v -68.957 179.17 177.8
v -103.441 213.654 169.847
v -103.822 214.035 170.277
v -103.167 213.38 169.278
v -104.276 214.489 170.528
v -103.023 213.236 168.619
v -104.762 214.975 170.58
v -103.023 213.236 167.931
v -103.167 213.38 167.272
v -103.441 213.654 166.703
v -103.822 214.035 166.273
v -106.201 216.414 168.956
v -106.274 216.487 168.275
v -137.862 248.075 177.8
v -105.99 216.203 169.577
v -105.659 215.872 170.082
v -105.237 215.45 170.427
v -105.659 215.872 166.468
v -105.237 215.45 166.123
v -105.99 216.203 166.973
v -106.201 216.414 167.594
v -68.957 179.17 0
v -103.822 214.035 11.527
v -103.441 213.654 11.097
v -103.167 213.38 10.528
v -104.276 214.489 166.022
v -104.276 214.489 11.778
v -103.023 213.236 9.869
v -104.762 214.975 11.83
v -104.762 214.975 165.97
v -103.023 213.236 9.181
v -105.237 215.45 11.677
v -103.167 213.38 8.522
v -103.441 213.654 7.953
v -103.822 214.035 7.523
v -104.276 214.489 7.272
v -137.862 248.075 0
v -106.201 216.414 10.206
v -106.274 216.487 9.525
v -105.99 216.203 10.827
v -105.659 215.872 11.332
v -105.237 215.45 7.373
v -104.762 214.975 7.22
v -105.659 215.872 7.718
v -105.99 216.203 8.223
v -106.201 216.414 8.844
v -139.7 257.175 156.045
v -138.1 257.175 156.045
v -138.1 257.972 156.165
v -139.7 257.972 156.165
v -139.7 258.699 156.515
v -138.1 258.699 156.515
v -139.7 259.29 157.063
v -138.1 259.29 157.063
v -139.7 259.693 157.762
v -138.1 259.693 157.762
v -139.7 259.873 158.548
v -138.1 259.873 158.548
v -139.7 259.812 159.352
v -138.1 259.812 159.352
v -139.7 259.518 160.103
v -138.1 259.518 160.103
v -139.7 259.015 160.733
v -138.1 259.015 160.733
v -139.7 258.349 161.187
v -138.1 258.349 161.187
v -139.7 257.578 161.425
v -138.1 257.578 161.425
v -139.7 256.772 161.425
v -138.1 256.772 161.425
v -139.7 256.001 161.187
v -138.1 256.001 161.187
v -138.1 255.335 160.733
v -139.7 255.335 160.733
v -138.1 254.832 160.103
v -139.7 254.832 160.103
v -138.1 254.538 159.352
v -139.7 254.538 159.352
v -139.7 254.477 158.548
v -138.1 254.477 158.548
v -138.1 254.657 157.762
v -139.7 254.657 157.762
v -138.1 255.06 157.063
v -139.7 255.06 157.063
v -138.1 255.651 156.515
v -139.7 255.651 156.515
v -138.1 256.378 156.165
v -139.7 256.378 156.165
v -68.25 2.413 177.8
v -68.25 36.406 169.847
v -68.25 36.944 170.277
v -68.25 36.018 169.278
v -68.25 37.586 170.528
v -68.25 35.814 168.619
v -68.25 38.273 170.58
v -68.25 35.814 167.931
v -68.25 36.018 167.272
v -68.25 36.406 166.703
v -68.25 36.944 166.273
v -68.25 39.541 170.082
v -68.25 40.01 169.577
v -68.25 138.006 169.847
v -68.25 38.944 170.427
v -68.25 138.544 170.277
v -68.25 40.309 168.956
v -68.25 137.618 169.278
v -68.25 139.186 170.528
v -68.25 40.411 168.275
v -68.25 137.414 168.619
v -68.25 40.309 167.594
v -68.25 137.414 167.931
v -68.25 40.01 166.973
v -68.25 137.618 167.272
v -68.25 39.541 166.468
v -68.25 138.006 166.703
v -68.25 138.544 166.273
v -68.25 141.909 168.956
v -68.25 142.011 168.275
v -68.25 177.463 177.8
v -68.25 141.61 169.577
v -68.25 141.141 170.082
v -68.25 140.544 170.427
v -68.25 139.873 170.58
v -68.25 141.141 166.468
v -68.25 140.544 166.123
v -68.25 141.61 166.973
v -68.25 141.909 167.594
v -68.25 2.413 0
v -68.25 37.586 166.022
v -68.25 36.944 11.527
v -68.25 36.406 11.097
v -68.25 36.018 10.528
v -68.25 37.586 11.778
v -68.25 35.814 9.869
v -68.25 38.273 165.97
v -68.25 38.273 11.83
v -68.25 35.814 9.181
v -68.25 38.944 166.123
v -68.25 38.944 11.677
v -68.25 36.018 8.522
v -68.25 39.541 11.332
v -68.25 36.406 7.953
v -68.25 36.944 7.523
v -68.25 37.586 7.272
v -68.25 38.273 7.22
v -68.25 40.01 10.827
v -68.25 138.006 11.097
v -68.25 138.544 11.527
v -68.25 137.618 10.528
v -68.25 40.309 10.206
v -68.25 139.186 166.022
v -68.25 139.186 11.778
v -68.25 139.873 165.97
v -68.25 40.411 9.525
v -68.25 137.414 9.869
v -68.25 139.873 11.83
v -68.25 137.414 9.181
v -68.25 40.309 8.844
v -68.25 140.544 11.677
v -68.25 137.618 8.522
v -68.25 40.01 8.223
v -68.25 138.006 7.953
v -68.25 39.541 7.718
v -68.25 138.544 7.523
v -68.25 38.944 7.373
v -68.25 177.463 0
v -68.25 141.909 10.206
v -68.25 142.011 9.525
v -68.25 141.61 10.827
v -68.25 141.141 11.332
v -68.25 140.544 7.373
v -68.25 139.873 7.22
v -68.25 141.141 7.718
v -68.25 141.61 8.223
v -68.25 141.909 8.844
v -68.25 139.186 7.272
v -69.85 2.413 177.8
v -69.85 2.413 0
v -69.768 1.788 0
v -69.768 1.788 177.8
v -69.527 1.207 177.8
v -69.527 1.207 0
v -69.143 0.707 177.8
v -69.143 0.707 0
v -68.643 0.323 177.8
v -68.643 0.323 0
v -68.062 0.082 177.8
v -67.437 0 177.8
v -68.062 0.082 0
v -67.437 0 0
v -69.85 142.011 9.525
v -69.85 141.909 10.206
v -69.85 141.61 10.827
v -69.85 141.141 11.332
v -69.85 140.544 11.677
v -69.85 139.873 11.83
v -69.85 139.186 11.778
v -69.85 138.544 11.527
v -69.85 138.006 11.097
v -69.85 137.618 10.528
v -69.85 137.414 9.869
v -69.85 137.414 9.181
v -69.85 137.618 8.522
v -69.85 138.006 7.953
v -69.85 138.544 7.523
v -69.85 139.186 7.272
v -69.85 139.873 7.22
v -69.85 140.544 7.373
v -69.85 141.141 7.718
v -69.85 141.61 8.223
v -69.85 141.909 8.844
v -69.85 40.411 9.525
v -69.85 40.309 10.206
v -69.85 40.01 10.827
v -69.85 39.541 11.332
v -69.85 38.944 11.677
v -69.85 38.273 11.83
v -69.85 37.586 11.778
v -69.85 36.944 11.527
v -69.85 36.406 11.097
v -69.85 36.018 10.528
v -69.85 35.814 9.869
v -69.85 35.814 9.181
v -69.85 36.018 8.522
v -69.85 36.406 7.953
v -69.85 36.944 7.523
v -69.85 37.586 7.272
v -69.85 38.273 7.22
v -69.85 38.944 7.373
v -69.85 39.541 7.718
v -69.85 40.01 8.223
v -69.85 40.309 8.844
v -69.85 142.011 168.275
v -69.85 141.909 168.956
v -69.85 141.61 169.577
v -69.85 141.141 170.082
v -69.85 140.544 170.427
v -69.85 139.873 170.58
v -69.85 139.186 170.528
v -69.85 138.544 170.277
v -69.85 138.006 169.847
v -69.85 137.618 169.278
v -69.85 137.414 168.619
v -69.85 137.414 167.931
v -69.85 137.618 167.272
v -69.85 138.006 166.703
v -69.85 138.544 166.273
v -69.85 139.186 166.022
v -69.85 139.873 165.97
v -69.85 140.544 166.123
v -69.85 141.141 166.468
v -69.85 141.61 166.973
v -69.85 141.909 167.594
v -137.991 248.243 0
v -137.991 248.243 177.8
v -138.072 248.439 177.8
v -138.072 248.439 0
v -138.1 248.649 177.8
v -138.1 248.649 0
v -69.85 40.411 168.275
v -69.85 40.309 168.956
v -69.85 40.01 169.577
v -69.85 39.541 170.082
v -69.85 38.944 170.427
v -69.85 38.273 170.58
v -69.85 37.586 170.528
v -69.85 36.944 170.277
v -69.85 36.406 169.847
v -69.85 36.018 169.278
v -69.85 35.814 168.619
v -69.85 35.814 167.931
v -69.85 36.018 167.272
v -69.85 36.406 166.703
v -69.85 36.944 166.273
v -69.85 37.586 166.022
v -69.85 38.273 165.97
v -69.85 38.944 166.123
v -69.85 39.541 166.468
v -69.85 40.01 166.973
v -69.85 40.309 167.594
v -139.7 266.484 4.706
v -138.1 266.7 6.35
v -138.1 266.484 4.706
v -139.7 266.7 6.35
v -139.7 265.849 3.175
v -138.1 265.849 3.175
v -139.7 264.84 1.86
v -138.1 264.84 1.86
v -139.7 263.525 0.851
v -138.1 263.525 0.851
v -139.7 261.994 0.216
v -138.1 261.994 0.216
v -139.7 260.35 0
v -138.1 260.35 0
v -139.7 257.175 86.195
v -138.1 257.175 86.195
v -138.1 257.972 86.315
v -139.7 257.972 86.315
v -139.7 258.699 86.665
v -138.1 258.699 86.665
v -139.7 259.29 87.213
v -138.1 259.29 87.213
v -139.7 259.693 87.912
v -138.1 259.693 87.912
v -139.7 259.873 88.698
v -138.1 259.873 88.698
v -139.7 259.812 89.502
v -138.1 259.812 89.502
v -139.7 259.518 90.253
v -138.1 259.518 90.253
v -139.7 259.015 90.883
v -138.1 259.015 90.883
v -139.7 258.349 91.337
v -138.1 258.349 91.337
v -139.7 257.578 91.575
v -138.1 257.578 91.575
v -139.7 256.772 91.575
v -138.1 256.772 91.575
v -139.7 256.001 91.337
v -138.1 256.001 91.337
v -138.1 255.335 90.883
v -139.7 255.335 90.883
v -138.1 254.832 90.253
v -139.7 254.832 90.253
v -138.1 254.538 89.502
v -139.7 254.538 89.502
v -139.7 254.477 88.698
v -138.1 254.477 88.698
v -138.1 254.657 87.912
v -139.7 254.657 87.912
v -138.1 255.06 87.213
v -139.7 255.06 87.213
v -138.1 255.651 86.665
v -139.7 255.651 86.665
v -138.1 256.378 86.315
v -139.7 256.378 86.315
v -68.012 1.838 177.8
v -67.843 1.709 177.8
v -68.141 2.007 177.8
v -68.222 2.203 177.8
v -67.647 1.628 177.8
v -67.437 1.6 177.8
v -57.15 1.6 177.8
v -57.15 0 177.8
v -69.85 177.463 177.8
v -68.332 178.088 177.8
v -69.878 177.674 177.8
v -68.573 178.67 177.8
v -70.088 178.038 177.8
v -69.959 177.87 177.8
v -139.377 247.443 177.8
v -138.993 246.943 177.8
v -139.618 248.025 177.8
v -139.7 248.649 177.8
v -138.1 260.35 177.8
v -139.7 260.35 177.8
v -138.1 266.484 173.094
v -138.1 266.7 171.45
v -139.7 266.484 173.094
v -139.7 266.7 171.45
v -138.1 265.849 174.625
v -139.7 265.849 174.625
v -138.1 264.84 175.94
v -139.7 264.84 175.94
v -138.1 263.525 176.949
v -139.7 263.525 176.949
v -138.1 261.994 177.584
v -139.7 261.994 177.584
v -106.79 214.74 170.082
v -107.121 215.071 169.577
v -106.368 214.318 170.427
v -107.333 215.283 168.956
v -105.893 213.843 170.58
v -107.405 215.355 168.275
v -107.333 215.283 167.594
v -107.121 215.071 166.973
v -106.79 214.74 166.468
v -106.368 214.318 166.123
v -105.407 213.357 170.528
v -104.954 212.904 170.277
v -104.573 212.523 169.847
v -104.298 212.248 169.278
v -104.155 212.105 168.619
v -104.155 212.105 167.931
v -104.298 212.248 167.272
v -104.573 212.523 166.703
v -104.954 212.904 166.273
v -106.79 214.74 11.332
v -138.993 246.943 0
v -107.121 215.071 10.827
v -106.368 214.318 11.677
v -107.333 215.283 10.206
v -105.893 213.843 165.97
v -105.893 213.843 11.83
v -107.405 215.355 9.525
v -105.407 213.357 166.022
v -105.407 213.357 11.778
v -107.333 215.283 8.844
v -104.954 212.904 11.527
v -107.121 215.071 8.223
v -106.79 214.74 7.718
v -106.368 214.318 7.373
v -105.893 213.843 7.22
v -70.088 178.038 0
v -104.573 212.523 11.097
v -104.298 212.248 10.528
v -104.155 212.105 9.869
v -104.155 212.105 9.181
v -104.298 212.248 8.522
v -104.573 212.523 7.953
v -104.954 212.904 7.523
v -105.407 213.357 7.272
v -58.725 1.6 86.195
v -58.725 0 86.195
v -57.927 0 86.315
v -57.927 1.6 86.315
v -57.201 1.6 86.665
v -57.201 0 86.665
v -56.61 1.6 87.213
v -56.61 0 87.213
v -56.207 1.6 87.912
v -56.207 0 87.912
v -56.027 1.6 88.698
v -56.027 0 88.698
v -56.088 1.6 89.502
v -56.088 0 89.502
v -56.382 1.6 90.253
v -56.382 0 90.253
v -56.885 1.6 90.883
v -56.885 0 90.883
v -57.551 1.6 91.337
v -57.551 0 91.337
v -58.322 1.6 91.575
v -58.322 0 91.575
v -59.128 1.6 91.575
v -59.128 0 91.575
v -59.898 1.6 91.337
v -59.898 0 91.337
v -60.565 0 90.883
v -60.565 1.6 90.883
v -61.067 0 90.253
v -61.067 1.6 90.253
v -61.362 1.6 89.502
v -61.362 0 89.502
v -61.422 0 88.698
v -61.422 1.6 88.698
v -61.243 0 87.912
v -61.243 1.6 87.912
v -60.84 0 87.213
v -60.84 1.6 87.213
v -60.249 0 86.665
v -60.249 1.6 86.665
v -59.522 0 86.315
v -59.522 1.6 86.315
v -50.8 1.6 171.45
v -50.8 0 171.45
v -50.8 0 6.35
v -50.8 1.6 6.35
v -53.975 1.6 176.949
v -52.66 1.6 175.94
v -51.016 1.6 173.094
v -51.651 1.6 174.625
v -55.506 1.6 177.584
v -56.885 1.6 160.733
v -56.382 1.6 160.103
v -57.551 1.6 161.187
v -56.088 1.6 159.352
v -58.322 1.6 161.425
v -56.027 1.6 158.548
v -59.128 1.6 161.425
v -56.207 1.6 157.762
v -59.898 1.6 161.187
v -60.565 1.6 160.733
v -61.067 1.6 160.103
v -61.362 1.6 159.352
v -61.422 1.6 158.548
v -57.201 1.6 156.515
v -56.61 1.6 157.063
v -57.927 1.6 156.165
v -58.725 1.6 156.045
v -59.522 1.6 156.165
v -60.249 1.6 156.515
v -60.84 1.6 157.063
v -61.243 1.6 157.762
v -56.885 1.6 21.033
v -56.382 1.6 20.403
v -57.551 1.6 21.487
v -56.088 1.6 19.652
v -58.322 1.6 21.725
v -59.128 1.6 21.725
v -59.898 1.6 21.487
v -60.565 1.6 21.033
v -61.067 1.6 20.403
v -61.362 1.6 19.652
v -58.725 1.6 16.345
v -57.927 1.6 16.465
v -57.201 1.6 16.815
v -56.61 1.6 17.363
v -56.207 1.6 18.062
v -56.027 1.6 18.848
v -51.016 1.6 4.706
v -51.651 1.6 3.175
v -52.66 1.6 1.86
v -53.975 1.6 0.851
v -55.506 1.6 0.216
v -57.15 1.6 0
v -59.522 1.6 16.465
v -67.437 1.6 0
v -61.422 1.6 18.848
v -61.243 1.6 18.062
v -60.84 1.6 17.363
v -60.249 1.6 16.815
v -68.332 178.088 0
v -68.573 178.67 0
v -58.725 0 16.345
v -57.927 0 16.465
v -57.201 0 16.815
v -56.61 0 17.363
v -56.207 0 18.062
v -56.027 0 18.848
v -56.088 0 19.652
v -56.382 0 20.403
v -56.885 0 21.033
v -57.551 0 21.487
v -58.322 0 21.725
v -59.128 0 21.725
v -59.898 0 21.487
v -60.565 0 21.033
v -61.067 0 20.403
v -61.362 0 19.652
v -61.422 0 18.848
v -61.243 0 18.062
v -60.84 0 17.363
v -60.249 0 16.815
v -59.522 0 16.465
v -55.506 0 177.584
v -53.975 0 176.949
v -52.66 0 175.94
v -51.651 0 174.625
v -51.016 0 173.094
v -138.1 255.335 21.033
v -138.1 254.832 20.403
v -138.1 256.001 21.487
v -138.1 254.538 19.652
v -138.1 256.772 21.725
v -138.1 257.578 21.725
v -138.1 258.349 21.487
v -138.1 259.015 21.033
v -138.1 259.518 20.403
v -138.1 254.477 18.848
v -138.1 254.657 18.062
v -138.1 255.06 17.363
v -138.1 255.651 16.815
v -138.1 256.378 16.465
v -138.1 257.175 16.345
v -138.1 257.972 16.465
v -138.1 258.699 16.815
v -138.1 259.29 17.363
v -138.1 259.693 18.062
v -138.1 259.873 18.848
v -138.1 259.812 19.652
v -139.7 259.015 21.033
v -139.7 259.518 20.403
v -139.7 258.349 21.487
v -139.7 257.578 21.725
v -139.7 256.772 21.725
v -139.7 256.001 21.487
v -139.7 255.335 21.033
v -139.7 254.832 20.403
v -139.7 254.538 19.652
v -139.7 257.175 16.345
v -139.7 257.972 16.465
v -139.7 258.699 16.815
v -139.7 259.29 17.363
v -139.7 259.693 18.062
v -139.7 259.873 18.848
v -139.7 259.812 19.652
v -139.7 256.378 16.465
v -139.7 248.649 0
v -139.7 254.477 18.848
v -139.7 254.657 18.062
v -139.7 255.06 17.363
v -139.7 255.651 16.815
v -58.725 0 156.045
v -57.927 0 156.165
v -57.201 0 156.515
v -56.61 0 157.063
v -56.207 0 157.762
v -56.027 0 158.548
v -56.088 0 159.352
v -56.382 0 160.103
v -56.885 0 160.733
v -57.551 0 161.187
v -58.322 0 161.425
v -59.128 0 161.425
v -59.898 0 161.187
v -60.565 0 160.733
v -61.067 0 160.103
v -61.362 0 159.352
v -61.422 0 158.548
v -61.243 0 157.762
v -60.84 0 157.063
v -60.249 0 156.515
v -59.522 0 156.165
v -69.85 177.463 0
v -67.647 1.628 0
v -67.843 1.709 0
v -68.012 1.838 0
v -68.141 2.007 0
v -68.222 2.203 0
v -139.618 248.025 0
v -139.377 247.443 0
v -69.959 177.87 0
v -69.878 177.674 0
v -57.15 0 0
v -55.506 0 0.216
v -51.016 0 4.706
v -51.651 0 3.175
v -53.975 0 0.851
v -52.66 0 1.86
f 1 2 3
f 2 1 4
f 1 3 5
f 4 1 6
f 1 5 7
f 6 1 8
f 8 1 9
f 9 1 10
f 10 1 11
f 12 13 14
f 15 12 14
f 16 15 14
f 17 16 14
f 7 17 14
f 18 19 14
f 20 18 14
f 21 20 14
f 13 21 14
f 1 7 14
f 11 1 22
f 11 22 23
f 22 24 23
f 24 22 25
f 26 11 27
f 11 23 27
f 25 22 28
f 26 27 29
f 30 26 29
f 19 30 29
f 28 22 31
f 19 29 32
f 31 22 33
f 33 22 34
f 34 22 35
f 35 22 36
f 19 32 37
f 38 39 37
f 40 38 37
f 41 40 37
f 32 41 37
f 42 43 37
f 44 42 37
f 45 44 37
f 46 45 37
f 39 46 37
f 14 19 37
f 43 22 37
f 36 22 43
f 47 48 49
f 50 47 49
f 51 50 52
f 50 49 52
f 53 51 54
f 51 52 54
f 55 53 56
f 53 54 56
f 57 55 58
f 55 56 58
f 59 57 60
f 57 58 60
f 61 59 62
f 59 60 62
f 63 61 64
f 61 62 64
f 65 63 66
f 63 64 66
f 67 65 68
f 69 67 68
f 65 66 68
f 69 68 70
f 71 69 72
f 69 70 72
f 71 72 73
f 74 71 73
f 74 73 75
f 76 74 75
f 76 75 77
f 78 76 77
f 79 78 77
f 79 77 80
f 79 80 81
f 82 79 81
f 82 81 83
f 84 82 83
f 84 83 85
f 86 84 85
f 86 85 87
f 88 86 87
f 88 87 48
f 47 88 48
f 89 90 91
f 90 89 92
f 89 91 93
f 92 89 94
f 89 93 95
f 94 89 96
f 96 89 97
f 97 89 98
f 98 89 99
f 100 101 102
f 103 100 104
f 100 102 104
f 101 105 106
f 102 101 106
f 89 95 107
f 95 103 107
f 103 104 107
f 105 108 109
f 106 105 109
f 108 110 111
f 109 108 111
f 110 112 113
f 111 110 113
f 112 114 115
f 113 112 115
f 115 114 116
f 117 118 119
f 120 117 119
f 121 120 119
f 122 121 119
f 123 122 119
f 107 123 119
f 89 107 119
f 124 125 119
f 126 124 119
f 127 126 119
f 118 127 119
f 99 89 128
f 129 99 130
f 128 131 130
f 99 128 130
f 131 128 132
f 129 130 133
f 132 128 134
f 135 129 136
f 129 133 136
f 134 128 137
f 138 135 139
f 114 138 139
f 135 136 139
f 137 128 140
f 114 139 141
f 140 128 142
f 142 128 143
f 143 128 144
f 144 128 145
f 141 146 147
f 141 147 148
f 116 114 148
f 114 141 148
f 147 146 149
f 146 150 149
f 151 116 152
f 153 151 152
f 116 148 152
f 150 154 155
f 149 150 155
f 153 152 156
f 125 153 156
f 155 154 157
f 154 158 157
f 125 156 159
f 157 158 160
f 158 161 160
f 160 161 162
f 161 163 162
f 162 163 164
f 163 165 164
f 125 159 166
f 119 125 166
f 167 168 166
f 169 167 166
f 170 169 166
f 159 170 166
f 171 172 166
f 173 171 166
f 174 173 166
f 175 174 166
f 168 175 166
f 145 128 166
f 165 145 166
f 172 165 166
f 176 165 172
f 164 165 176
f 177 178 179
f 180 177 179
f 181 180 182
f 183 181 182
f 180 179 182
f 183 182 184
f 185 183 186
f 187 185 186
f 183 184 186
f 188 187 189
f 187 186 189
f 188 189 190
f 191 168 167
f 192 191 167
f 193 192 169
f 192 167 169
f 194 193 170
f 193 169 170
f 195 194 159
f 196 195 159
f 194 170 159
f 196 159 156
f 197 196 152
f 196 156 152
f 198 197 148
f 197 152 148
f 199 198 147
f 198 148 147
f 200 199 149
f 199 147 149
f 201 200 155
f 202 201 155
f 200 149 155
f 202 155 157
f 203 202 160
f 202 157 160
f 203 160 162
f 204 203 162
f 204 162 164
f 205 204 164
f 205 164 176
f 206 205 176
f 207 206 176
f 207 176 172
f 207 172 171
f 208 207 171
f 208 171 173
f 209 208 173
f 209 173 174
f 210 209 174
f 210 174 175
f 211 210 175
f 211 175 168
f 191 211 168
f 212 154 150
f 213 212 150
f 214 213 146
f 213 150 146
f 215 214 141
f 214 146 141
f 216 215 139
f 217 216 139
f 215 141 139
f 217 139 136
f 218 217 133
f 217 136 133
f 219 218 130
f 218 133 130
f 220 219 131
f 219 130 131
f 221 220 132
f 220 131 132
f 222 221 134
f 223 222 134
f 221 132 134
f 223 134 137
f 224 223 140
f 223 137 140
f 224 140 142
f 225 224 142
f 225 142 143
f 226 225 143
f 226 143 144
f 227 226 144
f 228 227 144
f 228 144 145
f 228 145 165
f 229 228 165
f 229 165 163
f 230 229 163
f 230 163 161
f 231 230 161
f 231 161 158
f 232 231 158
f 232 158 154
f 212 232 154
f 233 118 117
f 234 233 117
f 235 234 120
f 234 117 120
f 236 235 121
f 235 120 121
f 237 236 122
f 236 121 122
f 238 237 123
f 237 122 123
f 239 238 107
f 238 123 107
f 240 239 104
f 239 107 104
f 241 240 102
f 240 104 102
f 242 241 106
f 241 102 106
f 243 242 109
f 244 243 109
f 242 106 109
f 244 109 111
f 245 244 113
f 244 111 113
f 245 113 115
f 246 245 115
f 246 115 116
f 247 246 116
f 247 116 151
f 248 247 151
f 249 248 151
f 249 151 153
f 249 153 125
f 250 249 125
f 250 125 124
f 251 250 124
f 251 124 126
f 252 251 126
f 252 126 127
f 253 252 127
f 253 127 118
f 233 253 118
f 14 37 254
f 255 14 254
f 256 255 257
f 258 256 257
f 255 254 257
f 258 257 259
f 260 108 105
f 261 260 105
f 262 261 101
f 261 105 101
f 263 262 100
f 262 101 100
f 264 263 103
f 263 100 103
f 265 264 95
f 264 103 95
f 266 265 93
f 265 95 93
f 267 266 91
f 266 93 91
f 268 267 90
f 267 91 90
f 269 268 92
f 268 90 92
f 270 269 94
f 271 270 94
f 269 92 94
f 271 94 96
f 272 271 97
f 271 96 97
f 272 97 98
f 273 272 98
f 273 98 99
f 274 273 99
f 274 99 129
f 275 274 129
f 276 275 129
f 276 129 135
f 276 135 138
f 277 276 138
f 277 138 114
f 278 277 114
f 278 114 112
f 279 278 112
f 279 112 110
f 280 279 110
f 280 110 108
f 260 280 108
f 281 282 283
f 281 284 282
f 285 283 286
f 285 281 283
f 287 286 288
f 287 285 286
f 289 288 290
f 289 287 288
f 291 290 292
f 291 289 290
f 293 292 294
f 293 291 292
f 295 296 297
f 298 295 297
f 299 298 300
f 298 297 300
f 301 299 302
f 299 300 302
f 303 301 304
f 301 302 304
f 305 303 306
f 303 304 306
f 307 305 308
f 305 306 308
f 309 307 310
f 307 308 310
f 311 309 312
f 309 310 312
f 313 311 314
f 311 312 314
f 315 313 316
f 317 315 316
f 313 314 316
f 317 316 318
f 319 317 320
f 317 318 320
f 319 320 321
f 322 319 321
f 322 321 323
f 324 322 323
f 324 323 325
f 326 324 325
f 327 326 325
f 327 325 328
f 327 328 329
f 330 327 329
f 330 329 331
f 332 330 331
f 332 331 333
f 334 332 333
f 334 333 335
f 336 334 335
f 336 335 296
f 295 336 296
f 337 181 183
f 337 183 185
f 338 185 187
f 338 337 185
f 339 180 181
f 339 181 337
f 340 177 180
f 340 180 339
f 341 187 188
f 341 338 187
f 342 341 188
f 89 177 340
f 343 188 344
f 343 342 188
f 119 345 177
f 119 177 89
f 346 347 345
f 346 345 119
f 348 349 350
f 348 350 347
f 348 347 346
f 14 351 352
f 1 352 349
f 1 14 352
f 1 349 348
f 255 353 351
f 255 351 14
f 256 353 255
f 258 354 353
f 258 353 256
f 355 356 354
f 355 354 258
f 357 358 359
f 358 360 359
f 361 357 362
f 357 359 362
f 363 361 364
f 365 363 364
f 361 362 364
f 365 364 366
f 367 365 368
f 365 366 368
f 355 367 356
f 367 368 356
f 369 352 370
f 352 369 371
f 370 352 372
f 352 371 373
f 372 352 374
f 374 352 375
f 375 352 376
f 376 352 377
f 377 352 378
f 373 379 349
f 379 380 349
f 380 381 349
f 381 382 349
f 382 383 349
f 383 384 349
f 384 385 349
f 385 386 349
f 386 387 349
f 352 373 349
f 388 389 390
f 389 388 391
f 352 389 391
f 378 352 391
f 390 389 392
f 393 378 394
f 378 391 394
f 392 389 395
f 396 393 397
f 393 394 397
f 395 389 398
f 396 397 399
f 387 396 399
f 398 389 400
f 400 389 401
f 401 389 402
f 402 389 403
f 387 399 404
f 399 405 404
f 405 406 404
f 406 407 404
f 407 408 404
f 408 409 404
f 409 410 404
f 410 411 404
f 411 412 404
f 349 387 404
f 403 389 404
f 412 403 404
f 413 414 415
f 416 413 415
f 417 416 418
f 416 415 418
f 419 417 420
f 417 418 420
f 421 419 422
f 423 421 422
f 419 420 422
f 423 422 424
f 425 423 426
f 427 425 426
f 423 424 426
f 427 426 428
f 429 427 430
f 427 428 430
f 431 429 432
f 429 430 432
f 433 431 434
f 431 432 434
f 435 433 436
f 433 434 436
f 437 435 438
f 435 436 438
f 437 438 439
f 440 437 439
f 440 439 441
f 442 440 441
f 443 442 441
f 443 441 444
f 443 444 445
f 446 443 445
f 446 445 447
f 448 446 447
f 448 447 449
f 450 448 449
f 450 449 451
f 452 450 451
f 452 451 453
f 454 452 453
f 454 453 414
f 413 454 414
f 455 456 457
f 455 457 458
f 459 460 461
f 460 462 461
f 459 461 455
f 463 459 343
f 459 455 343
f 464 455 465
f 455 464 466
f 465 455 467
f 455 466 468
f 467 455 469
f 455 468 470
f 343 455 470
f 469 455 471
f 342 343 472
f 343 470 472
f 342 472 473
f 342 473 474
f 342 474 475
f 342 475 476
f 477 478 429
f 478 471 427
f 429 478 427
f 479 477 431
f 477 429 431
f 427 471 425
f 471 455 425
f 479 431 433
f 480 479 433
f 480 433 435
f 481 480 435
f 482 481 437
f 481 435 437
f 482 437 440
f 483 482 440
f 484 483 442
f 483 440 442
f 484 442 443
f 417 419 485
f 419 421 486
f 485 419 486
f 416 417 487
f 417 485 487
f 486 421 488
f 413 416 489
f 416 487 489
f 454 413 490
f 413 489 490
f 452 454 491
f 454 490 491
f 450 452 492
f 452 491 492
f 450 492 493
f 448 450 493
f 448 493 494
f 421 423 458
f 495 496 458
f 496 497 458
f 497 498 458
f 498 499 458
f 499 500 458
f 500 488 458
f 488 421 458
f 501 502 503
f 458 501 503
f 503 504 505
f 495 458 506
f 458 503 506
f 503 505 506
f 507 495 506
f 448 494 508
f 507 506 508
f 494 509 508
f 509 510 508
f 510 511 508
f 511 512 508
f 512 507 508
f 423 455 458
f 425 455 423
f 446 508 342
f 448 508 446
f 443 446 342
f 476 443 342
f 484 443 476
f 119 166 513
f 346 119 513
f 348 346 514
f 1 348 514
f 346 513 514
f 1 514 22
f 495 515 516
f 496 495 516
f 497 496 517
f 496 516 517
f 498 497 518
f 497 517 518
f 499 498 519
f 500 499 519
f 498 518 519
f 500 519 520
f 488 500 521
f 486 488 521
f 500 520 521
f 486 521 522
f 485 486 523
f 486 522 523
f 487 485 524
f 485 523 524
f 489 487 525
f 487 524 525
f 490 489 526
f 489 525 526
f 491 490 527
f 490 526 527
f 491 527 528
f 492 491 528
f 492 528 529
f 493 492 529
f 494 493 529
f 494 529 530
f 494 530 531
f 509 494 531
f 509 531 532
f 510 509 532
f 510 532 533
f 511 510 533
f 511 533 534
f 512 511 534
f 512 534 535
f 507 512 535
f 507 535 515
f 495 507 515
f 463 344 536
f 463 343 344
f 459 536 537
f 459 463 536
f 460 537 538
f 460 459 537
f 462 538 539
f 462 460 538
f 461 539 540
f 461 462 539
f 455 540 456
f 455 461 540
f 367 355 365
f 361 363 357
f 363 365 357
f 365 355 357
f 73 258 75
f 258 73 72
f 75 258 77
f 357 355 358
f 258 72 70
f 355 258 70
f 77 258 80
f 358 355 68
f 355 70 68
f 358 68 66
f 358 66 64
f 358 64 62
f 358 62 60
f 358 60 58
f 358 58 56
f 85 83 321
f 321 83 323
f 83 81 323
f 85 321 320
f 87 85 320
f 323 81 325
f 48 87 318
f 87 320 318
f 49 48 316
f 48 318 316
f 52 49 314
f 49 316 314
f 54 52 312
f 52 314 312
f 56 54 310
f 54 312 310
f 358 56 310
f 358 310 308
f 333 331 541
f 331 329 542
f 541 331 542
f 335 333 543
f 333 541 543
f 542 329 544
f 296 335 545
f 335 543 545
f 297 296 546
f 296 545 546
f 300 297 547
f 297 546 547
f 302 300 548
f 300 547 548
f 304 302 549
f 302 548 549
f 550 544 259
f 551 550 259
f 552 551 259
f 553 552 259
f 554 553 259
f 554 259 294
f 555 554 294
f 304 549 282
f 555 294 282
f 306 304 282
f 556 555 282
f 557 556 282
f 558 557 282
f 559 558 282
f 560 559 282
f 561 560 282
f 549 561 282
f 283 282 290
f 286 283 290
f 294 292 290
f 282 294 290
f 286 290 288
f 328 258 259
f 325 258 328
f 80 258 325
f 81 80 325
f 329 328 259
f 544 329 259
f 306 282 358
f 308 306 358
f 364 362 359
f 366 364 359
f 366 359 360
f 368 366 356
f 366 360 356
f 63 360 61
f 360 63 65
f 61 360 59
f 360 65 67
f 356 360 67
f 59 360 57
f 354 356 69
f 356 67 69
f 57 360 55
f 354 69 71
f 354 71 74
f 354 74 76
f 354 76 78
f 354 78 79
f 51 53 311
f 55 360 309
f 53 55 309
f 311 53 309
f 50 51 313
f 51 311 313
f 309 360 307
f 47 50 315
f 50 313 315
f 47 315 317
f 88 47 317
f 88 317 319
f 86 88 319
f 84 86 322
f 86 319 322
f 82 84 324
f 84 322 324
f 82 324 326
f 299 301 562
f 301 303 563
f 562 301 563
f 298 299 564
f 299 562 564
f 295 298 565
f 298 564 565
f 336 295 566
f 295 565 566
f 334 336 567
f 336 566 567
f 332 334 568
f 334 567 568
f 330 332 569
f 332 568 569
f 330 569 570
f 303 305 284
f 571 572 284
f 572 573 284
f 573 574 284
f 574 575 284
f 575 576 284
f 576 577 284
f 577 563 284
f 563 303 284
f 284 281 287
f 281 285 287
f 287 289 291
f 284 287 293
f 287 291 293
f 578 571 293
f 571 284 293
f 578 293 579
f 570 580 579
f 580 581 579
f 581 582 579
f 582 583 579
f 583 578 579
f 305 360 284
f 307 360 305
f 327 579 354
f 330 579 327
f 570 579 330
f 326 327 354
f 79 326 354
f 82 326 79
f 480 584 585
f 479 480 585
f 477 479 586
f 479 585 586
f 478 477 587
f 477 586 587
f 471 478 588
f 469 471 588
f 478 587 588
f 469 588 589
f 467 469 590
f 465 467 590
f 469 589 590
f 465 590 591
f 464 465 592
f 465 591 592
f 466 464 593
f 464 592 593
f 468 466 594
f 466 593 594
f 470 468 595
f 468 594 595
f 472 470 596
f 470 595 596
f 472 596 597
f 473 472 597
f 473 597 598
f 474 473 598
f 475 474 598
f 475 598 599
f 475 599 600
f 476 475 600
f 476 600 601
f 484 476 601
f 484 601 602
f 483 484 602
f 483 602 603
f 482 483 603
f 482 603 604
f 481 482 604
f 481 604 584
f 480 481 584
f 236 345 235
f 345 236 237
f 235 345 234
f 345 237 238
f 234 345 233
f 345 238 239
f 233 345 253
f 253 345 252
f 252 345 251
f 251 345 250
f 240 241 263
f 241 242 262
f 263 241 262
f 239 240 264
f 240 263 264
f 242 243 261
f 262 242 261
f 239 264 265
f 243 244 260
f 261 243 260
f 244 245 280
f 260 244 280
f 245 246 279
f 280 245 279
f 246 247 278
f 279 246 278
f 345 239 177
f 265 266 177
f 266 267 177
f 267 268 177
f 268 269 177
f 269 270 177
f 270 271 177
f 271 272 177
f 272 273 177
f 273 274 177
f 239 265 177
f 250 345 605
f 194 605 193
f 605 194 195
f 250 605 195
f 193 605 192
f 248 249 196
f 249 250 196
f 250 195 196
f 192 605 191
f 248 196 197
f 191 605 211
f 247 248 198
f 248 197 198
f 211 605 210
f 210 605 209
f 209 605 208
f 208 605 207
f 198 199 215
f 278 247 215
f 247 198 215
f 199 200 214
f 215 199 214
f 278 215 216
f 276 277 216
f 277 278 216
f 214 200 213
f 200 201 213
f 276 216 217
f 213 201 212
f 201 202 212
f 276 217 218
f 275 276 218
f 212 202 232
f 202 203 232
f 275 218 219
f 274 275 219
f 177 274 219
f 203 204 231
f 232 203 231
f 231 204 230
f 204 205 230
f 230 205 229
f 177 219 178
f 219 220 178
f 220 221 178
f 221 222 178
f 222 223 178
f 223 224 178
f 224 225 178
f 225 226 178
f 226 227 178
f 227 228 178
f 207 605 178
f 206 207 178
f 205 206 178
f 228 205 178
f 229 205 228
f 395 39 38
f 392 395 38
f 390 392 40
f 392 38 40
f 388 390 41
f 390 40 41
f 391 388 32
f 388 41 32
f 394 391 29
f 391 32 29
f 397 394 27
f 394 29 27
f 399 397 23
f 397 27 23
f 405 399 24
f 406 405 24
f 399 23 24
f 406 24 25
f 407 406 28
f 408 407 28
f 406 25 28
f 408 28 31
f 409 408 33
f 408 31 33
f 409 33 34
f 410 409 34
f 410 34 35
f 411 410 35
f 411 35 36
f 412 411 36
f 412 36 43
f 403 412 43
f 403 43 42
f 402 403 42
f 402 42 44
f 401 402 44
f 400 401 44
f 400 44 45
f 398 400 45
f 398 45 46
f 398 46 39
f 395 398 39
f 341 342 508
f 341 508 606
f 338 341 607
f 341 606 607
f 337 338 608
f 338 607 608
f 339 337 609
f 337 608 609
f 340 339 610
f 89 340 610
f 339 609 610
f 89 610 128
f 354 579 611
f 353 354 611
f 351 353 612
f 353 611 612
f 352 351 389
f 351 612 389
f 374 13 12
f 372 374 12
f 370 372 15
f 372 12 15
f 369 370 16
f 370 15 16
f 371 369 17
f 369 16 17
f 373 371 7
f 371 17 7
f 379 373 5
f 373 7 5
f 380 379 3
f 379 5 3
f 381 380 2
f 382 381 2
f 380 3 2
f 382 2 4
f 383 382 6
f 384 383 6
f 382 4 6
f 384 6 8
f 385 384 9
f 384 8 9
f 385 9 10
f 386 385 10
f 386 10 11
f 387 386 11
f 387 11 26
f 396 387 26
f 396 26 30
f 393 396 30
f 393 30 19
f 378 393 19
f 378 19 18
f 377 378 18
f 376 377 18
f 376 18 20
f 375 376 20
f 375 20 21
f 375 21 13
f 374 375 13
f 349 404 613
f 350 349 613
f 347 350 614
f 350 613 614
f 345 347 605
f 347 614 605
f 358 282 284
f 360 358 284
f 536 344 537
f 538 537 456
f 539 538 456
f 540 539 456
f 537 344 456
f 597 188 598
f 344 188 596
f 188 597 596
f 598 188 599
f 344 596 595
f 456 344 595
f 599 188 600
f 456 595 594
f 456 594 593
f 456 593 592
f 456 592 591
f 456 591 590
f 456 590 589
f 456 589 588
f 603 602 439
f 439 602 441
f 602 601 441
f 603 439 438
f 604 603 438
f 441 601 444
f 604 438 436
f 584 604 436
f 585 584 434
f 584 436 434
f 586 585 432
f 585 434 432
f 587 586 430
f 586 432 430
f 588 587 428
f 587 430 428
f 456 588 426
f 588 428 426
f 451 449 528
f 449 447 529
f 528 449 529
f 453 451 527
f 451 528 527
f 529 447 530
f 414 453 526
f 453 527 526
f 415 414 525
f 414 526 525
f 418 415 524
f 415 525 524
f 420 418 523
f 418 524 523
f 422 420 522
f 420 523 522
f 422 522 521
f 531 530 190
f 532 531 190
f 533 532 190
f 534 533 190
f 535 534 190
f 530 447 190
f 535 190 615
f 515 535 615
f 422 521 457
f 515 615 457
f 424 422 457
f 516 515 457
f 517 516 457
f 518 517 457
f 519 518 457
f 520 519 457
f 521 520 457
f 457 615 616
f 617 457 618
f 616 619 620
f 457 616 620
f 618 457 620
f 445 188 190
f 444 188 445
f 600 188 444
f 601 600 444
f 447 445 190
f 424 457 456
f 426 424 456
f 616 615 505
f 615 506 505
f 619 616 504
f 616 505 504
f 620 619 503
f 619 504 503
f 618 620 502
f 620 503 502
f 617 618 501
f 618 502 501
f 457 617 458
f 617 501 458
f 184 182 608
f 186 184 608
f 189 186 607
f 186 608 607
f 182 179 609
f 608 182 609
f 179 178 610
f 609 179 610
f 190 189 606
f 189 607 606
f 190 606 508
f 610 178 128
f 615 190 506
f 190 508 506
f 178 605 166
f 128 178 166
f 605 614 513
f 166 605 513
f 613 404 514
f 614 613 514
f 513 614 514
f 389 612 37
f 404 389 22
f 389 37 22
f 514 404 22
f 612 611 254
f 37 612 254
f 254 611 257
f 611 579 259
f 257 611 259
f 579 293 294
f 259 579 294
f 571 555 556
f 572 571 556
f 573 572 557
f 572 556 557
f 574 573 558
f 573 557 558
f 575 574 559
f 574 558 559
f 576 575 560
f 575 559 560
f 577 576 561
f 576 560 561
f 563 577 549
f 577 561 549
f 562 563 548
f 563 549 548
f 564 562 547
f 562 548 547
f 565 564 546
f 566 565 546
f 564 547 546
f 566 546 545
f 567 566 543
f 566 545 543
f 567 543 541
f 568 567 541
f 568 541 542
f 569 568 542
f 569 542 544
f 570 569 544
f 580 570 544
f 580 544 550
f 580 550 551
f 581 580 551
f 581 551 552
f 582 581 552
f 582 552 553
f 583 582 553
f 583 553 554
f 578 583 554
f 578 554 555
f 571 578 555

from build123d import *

# Parameters (mm, degrees)
BASE_FLANGE1_DEPTH       = 177.8
SKETCH2_R                = 2.7051
CUT_EXTRUDE1_0213_DEPTH  = 7.62
SKETCH3_R                = 2.3114
CUT_EXTRUDE2_0_182_DEPTH = 7.62
SKETCH4_R                = 2.3114
CUT_EXTRUDE4_0_182_DEPTH = 7.62
SKETCH5_R                = 2.7051
CUT_EXTRUDE3_0_213_DEPTH = 7.62
FILLET1_R                = 6.35


# Sheet-metal steps are written as plain solids
with BuildPart() as part:
    # Sketch1 → Base-Flange1 (new body)
    with BuildSketch(Plane.XY):
        with BuildLine():
            Line((-139.7, 266.7), (-139.7, 248.649497326))
            ThreePointArc((-139.7, 248.649497326), (-139.516321312, 247.726082204), (-138.993248663, 246.943248663))
            Line((-138.993248663, 246.943248663), (-70.088063608, 178.038063608))
            ThreePointArc((-70.088063608, 178.038063608), (-69.911870716, 177.77437231), (-69.85, 177.463327217))
            Line((-69.85, 177.463327217), (-69.85, 2.413))
            ThreePointArc((-69.85, 2.413), (-69.143248663, 0.706751337), (-67.437, 0))
            Line((-67.437, 0), (-50.8, 0))
            Line((-50.8, 0), (-50.8, 1.6002))
            Line((-50.8, 1.6002), (-67.437, 1.6002))
            ThreePointArc((-67.437, 1.6002), (-68.011736392, 1.838263608), (-68.2498, 2.413))
            Line((-68.2498, 2.413), (-68.2498, 177.463327217))
            ThreePointArc((-68.2498, 177.463327216), (-68.433478688, 178.386742339), (-68.956551337, 179.16957588))
            Line((-68.956551337, 179.16957588), (-137.861736392, 248.074760934))
            ThreePointArc((-137.861736392, 248.074760934), (-138.037929284, 248.338452232), (-138.0998, 248.649497326))
            Line((-138.0998, 248.649497326), (-138.0998, 266.7))
            Line((-138.0998, 266.7), (-139.7, 266.7))
        make_face()
    extrude(amount=BASE_FLANGE1_DEPTH)

    # Sketch2 → Cut-Extrude1 .0213 (cut)
    with BuildSketch(Plane.XZ):
        with Locations(Location((-58.7248, 19.05, 0), (0, 0, 270))):
            Circle(SKETCH2_R)
        with Locations(Location((-58.7248, 88.9, 0), (0, 0, 270))):
            Circle(SKETCH2_R)
        with Locations(Location((-58.7248, 158.75, 0), (0, 0, 270))):
            Circle(SKETCH2_R)
    extrude(amount=-CUT_EXTRUDE1_0213_DEPTH, mode=Mode.SUBTRACT)

    # Sketch3 → Cut-Extrude2 0.182 (cut)
    with BuildSketch(Plane(origin=(-68.2498, 0, 0), x_dir=(0, 0, -1), z_dir=(1, 0, 0))):
        with Locations(Location((-168.275, 139.7, 0), (0, 0, 90))):
            Circle(SKETCH3_R)
        with Locations(Location((-168.275, 38.1, 0), (0, 0, 90))):
            Circle(SKETCH3_R)
        with Locations(Location((-9.525, 139.7, 0), (0, 0, 90))):
            Circle(SKETCH3_R)
        with Locations(Location((-9.525, 38.1, 0), (0, 0, 90))):
            Circle(SKETCH3_R)
    extrude(amount=-CUT_EXTRUDE2_0_182_DEPTH, mode=Mode.SUBTRACT)

    # Sketch4 → Cut-Extrude4 0.182 (cut)
    with BuildSketch(Plane(origin=(55.106512271, 55.106512271, 0), x_dir=(0, 0, -1), z_dir=(0.7071067811865511, 0.707106781186544, 0))):
        with Locations(Location((-168.275, 225.914994361, 0), (0, 0, 90))):
            Circle(SKETCH4_R)
        with Locations(Location((-9.525, 225.914994361, 0), (0, 0, 90))):
            Circle(SKETCH4_R)
    extrude(amount=-CUT_EXTRUDE4_0_182_DEPTH, mode=Mode.SUBTRACT)

    # Sketch5 → Cut-Extrude3 0.213 (cut)
    with BuildSketch(Plane(origin=(-138.0998, 0, 0), x_dir=(0, 0, -1), z_dir=(1, 0, 0))):
        with Locations((-158.75, 257.175)):
            Circle(SKETCH5_R)
        with Locations((-88.9, 257.175)):
            Circle(SKETCH5_R)
        with Locations((-19.05, 257.175)):
            Circle(SKETCH5_R)
    extrude(amount=-CUT_EXTRUDE3_0_213_DEPTH, mode=Mode.SUBTRACT)

    # Fillet1
    fillet1_edges = [part.edges().sort_by_distance(p)[0] for p in [
        (-50.8, 0.8001, 0),
        (-138.8999, 266.7, 0),
        (-50.8, 0.8001, 177.8),
        (-138.8999, 266.7, 177.8),
    ]]
    fillet(fillet1_edges, radius=FILLET1_R)


solid = part.part
